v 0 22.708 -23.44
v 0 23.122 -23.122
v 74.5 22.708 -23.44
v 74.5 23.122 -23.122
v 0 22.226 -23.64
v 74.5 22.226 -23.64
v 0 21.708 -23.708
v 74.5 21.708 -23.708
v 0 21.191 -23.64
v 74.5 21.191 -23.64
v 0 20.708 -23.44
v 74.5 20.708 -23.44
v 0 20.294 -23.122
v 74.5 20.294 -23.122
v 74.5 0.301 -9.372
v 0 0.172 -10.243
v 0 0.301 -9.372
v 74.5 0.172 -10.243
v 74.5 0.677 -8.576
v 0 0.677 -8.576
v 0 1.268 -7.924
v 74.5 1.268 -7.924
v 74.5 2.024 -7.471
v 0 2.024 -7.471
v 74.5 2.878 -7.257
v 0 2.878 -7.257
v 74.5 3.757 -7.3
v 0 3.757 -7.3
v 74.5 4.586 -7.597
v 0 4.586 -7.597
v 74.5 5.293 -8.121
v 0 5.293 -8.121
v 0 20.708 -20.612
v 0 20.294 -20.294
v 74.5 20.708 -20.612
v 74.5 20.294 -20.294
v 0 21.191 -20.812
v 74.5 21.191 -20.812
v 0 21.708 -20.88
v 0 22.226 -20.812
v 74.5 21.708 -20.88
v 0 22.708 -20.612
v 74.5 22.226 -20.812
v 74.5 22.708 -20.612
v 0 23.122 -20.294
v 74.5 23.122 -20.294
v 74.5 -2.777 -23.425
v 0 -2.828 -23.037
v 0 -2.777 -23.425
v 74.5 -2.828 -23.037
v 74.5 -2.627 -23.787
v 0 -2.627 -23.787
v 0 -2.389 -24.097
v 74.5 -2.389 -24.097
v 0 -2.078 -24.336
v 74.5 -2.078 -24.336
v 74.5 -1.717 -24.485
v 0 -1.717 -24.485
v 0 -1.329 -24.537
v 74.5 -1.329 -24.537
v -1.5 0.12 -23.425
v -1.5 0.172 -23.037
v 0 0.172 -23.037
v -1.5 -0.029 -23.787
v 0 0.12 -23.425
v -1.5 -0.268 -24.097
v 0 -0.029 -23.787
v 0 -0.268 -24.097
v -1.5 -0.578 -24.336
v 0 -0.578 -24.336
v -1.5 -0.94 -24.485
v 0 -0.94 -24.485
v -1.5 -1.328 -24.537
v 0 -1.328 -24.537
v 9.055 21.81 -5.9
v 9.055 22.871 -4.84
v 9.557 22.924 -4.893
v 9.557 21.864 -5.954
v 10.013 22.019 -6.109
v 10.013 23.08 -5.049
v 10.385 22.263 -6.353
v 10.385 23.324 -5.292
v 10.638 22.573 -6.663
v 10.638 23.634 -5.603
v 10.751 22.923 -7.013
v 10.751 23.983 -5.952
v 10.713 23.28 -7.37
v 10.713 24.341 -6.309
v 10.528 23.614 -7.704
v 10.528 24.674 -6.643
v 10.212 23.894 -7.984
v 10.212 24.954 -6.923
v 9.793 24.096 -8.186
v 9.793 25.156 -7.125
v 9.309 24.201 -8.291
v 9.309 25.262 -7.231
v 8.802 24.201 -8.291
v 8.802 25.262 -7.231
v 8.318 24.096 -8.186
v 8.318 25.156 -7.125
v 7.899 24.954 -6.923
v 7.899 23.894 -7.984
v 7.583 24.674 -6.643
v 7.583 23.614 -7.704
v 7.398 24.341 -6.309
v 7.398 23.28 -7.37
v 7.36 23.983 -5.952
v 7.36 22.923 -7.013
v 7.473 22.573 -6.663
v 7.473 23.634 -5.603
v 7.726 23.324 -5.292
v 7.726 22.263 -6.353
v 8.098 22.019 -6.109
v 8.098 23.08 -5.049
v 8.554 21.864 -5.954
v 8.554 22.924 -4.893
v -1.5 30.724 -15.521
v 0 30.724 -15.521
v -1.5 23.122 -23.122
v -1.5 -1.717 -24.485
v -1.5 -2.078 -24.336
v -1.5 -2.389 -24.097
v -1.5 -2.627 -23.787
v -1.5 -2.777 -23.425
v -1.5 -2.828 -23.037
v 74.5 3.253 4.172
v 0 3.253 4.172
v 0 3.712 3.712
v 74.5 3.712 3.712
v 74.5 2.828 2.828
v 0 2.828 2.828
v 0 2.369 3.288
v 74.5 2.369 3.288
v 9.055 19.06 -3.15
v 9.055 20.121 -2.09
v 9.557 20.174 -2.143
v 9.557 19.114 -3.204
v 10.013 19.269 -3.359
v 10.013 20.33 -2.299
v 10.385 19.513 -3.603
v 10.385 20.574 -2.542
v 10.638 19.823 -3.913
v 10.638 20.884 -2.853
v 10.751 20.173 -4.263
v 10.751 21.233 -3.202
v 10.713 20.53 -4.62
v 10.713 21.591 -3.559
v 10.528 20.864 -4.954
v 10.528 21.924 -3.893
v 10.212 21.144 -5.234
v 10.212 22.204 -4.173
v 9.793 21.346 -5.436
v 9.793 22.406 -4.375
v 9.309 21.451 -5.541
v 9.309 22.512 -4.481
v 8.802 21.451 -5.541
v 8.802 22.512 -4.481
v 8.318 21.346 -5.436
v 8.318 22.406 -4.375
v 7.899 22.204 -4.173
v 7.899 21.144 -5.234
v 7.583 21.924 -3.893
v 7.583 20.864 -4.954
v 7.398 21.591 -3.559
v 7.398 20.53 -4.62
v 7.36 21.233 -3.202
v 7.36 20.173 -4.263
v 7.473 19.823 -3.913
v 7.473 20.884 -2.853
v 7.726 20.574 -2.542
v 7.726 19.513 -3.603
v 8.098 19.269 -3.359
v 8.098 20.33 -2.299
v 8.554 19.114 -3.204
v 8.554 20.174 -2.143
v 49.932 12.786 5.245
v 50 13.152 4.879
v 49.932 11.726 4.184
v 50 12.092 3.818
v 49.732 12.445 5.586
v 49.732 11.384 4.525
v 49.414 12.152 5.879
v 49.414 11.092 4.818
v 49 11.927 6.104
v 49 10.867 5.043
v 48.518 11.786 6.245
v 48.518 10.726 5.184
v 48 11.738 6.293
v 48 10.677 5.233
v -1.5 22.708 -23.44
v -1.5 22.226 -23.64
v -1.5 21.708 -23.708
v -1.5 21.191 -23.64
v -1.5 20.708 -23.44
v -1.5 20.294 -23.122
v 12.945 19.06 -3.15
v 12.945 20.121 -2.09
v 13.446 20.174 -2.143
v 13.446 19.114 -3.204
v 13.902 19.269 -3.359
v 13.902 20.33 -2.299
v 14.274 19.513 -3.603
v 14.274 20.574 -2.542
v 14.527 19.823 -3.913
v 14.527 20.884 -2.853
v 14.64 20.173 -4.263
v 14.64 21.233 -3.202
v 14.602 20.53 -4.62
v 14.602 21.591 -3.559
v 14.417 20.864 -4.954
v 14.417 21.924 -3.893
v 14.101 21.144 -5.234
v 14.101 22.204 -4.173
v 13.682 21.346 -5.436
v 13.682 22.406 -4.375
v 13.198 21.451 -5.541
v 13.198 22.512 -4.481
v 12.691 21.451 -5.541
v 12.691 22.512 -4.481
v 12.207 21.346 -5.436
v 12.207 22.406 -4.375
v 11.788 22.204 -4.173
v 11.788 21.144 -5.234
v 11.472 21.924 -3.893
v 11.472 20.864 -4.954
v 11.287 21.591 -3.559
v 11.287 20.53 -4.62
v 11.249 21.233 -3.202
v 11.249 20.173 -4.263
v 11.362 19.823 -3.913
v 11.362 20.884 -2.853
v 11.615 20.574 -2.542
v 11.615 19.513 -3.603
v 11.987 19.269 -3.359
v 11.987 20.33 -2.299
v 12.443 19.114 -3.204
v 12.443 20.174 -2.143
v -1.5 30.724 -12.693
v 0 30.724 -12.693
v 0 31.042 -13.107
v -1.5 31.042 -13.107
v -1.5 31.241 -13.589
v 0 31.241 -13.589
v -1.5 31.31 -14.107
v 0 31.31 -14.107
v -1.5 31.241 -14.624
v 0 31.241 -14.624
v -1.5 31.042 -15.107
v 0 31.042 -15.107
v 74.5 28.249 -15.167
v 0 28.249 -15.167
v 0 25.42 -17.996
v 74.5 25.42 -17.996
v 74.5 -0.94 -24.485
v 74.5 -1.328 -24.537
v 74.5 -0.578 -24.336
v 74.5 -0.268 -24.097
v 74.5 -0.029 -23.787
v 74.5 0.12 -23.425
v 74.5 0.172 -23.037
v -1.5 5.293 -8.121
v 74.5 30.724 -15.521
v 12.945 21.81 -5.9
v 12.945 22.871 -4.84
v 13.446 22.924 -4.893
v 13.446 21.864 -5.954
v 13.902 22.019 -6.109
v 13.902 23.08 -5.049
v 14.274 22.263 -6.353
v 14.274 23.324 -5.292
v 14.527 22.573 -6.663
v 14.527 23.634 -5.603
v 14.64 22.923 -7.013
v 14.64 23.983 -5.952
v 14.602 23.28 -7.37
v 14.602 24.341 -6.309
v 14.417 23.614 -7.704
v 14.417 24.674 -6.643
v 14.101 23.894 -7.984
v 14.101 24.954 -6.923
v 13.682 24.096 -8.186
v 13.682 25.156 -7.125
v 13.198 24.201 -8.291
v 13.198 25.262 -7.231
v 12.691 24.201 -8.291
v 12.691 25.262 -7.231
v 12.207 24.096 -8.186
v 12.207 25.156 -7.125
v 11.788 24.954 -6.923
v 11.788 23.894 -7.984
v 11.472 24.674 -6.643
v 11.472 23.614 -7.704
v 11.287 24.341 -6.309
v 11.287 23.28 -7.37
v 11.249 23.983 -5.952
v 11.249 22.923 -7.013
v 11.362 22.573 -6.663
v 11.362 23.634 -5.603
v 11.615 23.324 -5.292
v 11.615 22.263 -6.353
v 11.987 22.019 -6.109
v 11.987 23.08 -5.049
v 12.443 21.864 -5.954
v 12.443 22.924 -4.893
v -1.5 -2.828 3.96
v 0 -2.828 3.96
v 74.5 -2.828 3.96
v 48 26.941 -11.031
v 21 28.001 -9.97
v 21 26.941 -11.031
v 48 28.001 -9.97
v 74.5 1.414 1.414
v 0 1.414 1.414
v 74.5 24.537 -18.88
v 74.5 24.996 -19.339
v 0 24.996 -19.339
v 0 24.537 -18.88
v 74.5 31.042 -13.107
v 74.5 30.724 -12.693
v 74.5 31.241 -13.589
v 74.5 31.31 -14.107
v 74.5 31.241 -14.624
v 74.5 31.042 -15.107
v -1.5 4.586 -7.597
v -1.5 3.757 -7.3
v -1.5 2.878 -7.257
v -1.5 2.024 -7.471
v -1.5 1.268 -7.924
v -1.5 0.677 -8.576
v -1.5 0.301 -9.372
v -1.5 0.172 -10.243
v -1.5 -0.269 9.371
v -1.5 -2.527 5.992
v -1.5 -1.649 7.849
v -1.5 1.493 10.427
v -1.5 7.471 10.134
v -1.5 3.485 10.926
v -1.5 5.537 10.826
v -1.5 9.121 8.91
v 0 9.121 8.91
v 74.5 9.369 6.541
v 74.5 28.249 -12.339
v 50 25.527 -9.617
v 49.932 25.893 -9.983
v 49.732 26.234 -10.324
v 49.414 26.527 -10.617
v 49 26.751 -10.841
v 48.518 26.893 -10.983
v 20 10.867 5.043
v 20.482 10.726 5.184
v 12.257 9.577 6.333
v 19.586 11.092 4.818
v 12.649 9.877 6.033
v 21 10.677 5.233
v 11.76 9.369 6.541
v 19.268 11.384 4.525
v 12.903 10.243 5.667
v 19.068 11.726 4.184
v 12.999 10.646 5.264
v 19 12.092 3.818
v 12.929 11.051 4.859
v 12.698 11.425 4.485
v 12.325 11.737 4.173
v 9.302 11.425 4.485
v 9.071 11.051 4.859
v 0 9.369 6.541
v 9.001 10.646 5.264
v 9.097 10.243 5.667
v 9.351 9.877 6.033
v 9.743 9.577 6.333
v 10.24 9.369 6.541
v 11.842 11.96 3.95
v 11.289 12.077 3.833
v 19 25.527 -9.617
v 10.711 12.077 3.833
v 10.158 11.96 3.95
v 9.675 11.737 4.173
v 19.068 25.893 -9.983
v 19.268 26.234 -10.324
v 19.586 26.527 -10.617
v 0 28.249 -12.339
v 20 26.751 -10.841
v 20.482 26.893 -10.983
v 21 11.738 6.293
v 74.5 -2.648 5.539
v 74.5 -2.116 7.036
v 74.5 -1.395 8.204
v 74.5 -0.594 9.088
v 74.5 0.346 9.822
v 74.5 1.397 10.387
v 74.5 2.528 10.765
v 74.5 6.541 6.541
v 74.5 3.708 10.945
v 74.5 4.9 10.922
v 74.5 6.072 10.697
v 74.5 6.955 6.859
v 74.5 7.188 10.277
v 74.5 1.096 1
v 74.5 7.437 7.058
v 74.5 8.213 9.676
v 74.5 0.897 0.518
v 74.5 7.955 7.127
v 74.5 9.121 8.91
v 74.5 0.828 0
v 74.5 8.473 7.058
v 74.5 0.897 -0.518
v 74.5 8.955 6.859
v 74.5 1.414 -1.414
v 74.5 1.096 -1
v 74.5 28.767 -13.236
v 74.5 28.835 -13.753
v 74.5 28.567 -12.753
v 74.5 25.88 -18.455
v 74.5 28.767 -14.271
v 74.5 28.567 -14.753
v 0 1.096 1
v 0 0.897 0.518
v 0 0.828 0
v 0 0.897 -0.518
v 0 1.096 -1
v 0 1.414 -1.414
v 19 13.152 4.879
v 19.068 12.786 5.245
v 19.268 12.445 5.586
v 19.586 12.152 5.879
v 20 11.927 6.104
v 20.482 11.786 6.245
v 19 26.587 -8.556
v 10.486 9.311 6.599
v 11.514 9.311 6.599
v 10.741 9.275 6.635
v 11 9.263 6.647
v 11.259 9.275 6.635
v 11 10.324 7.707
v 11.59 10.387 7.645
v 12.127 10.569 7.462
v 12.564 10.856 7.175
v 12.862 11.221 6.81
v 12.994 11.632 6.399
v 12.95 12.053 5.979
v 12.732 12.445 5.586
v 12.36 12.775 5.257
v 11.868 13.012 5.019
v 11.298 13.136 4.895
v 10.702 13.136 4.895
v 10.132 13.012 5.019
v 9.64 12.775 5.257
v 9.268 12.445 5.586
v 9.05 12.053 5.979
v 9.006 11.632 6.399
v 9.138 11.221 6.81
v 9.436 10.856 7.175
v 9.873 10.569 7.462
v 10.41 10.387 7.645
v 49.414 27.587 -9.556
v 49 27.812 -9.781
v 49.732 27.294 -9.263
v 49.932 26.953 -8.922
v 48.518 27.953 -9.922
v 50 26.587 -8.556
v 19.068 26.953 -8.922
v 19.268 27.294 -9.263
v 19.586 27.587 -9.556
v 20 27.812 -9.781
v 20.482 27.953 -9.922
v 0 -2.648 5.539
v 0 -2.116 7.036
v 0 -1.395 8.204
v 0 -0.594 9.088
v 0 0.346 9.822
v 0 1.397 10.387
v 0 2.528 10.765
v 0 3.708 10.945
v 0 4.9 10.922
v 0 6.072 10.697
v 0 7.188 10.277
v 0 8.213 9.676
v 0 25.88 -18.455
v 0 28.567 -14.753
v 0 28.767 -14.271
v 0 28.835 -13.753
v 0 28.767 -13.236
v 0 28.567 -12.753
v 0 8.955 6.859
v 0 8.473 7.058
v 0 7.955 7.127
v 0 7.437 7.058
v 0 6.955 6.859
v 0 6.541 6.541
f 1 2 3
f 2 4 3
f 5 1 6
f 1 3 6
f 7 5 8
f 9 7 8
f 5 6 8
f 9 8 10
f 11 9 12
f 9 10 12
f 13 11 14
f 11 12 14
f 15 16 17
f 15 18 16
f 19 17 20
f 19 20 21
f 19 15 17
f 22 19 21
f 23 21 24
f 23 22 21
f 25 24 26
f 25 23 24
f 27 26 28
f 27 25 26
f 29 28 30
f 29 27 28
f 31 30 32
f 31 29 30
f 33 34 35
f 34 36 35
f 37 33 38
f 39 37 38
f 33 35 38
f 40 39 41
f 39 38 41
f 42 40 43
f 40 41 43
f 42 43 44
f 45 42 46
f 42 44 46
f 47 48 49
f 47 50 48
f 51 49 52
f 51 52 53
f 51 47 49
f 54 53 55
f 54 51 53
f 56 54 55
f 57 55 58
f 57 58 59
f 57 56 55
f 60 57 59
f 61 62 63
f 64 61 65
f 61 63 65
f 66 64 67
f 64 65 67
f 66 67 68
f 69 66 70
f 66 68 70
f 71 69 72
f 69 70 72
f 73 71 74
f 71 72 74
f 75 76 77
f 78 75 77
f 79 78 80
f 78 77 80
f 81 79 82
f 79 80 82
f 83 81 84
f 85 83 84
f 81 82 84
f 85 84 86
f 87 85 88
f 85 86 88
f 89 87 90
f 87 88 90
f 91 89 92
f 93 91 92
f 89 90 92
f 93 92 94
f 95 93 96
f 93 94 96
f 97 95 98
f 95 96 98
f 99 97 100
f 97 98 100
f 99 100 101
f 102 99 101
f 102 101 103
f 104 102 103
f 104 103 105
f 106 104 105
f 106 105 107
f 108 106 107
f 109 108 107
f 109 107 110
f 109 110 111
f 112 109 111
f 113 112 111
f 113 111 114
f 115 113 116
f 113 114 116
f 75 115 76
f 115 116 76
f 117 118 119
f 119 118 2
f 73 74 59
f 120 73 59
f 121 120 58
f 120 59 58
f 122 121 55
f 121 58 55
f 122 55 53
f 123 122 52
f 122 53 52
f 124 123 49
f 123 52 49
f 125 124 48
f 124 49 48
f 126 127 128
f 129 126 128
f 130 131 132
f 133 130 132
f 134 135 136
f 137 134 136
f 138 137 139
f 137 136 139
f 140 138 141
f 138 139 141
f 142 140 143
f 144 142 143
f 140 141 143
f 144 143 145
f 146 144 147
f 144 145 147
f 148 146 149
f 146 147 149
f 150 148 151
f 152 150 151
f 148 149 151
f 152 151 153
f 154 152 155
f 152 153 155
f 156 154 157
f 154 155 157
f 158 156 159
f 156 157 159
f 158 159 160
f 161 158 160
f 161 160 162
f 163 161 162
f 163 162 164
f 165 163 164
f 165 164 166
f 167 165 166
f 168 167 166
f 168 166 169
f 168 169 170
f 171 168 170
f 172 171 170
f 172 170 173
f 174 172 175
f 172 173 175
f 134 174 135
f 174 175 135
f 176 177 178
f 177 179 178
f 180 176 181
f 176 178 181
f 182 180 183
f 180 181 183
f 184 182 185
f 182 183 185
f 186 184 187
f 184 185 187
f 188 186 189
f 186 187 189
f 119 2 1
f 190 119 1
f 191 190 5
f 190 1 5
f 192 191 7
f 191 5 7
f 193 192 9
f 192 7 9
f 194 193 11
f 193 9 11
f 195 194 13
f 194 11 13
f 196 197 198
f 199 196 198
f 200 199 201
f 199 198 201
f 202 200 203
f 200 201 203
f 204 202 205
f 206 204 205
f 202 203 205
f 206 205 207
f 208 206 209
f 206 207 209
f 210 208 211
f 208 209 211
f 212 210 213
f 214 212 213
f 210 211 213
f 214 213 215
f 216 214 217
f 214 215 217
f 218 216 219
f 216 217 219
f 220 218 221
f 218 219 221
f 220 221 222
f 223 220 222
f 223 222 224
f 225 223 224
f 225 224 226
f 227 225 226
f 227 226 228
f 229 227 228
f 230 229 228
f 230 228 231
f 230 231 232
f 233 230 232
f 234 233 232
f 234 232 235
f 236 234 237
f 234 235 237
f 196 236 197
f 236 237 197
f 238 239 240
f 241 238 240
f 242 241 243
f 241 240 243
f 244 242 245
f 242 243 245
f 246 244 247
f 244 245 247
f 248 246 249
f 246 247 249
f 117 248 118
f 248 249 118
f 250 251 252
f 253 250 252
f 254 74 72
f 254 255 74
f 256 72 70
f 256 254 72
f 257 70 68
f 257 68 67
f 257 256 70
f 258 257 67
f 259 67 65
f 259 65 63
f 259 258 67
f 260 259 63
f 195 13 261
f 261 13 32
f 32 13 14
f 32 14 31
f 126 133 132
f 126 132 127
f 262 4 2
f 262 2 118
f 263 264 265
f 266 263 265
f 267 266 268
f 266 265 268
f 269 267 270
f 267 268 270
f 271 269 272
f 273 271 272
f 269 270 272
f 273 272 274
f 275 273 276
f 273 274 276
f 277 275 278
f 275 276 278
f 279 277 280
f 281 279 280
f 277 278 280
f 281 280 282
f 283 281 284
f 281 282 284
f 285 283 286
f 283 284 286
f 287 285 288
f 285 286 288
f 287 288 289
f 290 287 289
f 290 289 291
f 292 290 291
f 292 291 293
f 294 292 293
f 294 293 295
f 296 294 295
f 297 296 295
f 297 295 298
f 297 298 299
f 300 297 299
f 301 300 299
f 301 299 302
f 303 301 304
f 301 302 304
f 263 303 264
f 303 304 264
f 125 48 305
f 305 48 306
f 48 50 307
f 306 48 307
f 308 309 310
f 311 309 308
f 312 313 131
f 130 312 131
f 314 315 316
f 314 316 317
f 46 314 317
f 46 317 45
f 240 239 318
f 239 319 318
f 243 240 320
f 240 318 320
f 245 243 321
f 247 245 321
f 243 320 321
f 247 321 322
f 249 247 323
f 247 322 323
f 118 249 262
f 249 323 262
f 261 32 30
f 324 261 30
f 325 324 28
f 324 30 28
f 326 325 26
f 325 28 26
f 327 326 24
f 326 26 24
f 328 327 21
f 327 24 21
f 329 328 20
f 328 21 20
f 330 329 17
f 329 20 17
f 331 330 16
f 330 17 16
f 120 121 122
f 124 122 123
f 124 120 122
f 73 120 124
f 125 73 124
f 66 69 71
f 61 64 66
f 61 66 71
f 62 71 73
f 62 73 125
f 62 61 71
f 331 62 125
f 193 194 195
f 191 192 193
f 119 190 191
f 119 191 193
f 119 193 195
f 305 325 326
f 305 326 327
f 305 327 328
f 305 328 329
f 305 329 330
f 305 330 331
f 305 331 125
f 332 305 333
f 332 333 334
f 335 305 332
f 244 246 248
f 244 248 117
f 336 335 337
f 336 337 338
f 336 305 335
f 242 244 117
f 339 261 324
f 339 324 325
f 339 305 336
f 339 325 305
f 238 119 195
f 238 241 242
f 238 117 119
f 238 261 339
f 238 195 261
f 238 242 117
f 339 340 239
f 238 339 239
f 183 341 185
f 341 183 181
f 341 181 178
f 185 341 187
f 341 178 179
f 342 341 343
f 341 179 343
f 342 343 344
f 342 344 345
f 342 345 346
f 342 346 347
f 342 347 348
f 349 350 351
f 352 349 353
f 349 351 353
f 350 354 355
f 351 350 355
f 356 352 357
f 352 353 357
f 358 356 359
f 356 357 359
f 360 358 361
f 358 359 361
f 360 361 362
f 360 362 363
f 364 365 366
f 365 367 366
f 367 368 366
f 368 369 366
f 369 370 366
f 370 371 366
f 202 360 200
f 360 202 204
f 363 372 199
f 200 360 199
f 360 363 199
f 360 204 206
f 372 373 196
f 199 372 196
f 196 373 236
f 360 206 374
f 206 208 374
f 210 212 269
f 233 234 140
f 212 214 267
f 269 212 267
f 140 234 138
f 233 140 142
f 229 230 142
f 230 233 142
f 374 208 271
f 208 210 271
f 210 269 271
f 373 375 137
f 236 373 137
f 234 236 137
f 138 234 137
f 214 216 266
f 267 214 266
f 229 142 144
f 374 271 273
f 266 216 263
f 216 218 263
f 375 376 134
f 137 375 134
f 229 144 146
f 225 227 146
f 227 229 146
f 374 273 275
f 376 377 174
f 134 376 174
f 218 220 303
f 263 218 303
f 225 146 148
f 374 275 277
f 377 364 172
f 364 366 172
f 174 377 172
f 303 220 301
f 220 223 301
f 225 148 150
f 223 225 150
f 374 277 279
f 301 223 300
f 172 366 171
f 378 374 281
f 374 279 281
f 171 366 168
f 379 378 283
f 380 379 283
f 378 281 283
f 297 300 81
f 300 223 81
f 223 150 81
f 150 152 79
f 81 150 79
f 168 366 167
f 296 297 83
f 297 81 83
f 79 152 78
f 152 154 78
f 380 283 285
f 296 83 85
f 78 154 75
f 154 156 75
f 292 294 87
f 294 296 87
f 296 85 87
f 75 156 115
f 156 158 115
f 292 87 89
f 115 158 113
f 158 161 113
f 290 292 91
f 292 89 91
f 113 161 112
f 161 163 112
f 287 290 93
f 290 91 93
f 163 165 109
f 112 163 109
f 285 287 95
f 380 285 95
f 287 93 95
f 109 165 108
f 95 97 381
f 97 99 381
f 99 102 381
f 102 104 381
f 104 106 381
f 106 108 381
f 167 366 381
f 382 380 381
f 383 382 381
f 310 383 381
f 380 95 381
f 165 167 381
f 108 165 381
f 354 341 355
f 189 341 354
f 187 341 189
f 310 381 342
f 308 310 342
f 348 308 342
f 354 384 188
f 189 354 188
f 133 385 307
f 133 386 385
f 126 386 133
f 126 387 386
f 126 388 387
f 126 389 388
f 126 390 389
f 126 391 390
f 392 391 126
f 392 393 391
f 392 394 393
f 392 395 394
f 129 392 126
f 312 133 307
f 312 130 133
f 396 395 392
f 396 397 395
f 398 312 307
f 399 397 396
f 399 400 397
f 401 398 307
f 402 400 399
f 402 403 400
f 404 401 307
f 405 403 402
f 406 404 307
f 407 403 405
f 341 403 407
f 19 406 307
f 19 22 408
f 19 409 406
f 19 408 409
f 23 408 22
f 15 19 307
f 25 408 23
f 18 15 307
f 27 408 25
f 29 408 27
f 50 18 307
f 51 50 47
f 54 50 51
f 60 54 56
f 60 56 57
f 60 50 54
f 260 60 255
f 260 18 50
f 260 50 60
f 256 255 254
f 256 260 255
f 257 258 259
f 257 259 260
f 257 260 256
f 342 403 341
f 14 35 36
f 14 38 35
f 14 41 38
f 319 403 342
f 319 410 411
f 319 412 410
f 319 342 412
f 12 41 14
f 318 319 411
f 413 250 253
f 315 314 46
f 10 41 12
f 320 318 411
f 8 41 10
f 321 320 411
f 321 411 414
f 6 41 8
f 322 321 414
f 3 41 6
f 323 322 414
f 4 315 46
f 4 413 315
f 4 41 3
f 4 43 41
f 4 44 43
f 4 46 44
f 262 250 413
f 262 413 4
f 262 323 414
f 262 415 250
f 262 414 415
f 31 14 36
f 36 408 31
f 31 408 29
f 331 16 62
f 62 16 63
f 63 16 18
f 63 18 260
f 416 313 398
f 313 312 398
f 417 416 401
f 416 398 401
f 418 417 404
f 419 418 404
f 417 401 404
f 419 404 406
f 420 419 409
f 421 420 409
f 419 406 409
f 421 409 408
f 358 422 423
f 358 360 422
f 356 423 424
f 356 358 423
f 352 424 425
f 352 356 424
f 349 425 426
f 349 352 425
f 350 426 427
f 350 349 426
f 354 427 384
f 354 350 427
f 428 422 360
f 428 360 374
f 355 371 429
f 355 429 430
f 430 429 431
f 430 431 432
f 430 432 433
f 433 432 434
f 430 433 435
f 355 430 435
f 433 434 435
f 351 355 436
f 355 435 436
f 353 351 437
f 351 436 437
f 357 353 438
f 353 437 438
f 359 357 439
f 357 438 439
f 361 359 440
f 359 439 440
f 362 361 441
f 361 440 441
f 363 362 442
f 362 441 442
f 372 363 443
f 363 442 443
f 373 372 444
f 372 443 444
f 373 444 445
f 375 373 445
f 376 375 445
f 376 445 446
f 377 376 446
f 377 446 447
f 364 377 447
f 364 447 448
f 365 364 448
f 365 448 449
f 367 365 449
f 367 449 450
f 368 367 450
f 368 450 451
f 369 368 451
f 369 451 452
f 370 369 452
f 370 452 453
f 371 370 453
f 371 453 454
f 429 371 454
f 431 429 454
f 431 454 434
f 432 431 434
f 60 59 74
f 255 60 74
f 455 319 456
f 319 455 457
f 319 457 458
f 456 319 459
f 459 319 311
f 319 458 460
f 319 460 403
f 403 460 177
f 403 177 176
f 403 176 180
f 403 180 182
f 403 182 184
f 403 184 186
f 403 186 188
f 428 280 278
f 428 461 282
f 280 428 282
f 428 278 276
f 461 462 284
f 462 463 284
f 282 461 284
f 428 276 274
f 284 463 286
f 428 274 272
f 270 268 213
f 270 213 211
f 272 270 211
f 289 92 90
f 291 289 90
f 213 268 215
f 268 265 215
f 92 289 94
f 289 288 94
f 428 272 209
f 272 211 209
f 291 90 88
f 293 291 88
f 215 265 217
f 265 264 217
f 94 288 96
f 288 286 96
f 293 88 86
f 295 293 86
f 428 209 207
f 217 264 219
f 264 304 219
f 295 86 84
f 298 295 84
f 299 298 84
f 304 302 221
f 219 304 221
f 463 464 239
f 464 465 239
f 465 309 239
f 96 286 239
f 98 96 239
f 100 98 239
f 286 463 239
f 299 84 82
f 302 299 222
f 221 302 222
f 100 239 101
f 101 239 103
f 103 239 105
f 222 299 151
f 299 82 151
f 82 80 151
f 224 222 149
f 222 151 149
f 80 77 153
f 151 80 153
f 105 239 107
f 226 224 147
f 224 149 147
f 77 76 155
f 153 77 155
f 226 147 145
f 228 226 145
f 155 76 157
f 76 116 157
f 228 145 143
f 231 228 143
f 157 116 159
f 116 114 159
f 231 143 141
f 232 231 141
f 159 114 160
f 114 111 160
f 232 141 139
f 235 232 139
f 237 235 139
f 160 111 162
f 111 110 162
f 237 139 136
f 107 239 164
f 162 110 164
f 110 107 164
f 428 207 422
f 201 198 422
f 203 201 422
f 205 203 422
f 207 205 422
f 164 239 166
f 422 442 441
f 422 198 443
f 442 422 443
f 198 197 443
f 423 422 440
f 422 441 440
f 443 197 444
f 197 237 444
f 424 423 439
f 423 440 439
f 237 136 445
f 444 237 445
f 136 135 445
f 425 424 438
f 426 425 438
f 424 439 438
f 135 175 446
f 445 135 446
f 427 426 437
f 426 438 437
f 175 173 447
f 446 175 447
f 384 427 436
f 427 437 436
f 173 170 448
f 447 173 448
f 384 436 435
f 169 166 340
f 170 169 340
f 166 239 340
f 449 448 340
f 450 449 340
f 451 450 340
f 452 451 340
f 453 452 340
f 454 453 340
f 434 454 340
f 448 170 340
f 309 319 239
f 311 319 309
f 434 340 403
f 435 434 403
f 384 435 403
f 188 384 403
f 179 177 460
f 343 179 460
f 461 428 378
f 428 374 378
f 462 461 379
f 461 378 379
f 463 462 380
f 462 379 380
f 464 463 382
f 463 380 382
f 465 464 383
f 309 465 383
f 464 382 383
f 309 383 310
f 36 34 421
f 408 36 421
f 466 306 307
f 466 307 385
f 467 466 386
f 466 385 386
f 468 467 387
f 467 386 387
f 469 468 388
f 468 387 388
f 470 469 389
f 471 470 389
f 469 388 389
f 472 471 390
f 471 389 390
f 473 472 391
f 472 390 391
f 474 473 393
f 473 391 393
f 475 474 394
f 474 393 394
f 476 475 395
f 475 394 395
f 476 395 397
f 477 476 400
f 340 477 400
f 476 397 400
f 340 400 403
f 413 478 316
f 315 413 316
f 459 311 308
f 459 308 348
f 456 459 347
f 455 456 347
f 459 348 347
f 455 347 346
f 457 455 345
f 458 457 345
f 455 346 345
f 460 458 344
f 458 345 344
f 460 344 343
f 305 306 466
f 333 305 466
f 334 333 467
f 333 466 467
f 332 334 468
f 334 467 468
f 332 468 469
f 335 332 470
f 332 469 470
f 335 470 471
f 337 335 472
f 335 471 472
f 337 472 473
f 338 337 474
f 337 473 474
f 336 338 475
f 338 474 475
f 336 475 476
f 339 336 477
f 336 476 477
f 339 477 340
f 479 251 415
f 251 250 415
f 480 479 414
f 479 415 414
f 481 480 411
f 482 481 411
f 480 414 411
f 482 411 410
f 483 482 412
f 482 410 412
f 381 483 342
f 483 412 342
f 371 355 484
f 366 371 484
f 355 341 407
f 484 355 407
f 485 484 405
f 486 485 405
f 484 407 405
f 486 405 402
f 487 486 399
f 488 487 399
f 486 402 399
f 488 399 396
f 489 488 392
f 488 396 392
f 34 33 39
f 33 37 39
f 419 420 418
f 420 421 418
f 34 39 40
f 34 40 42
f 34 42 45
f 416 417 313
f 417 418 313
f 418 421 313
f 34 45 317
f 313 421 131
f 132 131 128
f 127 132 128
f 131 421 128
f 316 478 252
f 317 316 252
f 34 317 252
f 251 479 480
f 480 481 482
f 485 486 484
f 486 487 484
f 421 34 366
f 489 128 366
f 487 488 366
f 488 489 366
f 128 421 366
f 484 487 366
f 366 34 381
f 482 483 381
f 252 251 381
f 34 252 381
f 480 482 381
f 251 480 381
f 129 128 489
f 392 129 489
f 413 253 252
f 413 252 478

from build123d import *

# Parameters (mm, degrees)
BOSS_EXTRUDE1_DEPTH = 74.5
FILLET1_R           = 7
FILLET2_R           = 2
FILLET3_R           = 1.5
FILLET4_R           = 3
SKETCH3_R           = 2
SKETCH3_R_2         = 1.7
SKETCH3_W           = 31
SKETCH3_H           = 23
CUT_EXTRUDE1_DEPTH  = 1.5
FILLET5_R           = 2
BOSS_EXTRUDE3_DEPTH = 1.5


with BuildPart() as part:
    # Sketch1 → Boss-Extrude1 (new body)
    with BuildSketch(Plane(origin=(0, 0, 0), x_dir=(0, 0, -1), z_dir=(1, 0, 0))):
        Polygon((-20.859650045, -2.828427125), (0, -2.828427125), (24.536605307, -2.828427125), (24.536605307, 0.171572875), (3, 0.171572875), (24.536605307, 21.708178182), (14.106780285, 32.138003205), (-10.429825023, 7.601397898), align=None)
        Polygon((19.339370465, 24.996224715), (18.879751058, 24.536605307), (21.708178182, 21.708178182), (0, 0), (-2.828427125, 2.828427125), (-3.288046533, 2.368807717), (-4.171930009, 3.252691193), (-3.712310601, 3.712310601), (-7.954951288, 7.954951288), (13.753226894, 29.663129471), (17.995867581, 25.420488784), (18.455486989, 25.880108191), align=None, mode=Mode.SUBTRACT)
    extrude(amount=BOSS_EXTRUDE1_DEPTH)

    # Fillet1
    fillet1_edges = [part.edges().sort_by_distance(p)[0] for p in [
        (37.25, -2.828427125, 20.859650045),
    ]]
    fillet(fillet1_edges, radius=FILLET1_R)

    # Fillet2
    fillet2_edges = [part.edges().sort_by_distance(p)[0] for p in [
        (37.25, 32.138003205, -14.106780285),
        (37.25, 21.708178182, -24.536605307),
        (37.25, 29.663129471, -13.753226894),
        (37.25, 7.954951288, 7.954951288),
        (37.25, 0, 0),
        (37.25, 21.708178182, -21.708178182),
    ]]
    fillet(fillet2_edges, radius=FILLET2_R)

    # Fillet3
    fillet3_edges = [part.edges().sort_by_distance(p)[0] for p in [
        (37.25, -2.828427125, -24.536605307),
        (37.25, 0.171572875, -24.536605307),
    ]]
    fillet(fillet3_edges, radius=FILLET3_R - 0.0001)  # a hair under: the kernel refuses the full size

    # Fillet4
    fillet4_edges = [part.edges().sort_by_distance(p)[0] for p in [
        (37.25, 0.171572875, -3),
    ]]
    fillet(fillet4_edges, radius=FILLET4_R)

    # Sketch3 → Cut-Extrude1 (cut)
    with BuildSketch(Plane(origin=(0, 9.01561146, 9.01561146), x_dir=(1, 0, 0), z_dir=(0, 0.7071067811865475, 0.7071067811865476))):
        with Locations(Location((11, 3.85, 0), (0, 0, 270))):
            Circle(SKETCH3_R)
        with Locations(Location((12.944543648, 17.405456352, 0), (0, 0, 270))):
            Circle(SKETCH3_R_2)
        with Locations(Location((12.944543648, 21.294543648, 0), (0, 0, 270))):
            Circle(SKETCH3_R_2)
        with Locations(Location((9.055456352, 21.294543648, 0), (0, 0, 270))):
            Circle(SKETCH3_R_2)
        with Locations(Location((9.055456352, 17.405456352, 0), (0, 0, 270))):
            Circle(SKETCH3_R_2)
        with Locations((34.5, 15.35)):
            Rectangle(SKETCH3_W, SKETCH3_H)
    extrude(amount=-CUT_EXTRUDE1_DEPTH, mode=Mode.SUBTRACT)

    # Fillet5
    fillet5_edges = [part.edges().sort_by_distance(p)[0] for p in [
        (19, 11.207642482, 5.762920267),
        (19, 27.471098449, -10.500535701),
        (50, 27.471098449, -10.500535701),
        (50, 11.207642482, 5.762920267),
    ]]
    fillet(fillet5_edges, radius=FILLET5_R)

    # Sketch4 → Boss-Extrude3 (add)
    with BuildSketch(Plane.ZY):
        with BuildLine():
            Line((-23.036605307, -2.828427125), (3.960155108, -2.828427125))
            ThreePointArc((3.960155108, -2.828427125), (10.427311836, 1.492788849), (8.909902577, 9.121320344))
            Line((8.909902577, 9.121320344), (-12.692566722, 30.723789643))
            ThreePointArc((-12.692566722, 30.723789643), (-14.106780285, 31.30957608), (-15.520993847, 30.723789643))
            Line((-15.520993847, 30.723789643), (-23.122391745, 23.122391745))
            ThreePointArc((-23.122391745, 23.122391745), (-23.708178182, 21.708178182), (-23.122391745, 20.29396462))
            Line((-23.122391745, 20.29396462), (-8.121320344, 5.292893219))
            ThreePointArc((-8.121320344, 5.292893219), (-7.47100209, 2.023522578), (-10.242640687, 0.171572875))
            Line((-10.242640687, 0.171572875), (-23.036605307, 0.171572875))
            ThreePointArc((-23.036605307, 0.171572875), (-24.097265479, -0.267766953), (-24.536605307, -1.328427125))
            ThreePointArc((-24.536605307, -1.328427125), (-24.097265479, -2.389087297), (-23.036605307, -2.828427125))
        make_face()
    extrude(amount=BOSS_EXTRUDE3_DEPTH)


solid = part.part
